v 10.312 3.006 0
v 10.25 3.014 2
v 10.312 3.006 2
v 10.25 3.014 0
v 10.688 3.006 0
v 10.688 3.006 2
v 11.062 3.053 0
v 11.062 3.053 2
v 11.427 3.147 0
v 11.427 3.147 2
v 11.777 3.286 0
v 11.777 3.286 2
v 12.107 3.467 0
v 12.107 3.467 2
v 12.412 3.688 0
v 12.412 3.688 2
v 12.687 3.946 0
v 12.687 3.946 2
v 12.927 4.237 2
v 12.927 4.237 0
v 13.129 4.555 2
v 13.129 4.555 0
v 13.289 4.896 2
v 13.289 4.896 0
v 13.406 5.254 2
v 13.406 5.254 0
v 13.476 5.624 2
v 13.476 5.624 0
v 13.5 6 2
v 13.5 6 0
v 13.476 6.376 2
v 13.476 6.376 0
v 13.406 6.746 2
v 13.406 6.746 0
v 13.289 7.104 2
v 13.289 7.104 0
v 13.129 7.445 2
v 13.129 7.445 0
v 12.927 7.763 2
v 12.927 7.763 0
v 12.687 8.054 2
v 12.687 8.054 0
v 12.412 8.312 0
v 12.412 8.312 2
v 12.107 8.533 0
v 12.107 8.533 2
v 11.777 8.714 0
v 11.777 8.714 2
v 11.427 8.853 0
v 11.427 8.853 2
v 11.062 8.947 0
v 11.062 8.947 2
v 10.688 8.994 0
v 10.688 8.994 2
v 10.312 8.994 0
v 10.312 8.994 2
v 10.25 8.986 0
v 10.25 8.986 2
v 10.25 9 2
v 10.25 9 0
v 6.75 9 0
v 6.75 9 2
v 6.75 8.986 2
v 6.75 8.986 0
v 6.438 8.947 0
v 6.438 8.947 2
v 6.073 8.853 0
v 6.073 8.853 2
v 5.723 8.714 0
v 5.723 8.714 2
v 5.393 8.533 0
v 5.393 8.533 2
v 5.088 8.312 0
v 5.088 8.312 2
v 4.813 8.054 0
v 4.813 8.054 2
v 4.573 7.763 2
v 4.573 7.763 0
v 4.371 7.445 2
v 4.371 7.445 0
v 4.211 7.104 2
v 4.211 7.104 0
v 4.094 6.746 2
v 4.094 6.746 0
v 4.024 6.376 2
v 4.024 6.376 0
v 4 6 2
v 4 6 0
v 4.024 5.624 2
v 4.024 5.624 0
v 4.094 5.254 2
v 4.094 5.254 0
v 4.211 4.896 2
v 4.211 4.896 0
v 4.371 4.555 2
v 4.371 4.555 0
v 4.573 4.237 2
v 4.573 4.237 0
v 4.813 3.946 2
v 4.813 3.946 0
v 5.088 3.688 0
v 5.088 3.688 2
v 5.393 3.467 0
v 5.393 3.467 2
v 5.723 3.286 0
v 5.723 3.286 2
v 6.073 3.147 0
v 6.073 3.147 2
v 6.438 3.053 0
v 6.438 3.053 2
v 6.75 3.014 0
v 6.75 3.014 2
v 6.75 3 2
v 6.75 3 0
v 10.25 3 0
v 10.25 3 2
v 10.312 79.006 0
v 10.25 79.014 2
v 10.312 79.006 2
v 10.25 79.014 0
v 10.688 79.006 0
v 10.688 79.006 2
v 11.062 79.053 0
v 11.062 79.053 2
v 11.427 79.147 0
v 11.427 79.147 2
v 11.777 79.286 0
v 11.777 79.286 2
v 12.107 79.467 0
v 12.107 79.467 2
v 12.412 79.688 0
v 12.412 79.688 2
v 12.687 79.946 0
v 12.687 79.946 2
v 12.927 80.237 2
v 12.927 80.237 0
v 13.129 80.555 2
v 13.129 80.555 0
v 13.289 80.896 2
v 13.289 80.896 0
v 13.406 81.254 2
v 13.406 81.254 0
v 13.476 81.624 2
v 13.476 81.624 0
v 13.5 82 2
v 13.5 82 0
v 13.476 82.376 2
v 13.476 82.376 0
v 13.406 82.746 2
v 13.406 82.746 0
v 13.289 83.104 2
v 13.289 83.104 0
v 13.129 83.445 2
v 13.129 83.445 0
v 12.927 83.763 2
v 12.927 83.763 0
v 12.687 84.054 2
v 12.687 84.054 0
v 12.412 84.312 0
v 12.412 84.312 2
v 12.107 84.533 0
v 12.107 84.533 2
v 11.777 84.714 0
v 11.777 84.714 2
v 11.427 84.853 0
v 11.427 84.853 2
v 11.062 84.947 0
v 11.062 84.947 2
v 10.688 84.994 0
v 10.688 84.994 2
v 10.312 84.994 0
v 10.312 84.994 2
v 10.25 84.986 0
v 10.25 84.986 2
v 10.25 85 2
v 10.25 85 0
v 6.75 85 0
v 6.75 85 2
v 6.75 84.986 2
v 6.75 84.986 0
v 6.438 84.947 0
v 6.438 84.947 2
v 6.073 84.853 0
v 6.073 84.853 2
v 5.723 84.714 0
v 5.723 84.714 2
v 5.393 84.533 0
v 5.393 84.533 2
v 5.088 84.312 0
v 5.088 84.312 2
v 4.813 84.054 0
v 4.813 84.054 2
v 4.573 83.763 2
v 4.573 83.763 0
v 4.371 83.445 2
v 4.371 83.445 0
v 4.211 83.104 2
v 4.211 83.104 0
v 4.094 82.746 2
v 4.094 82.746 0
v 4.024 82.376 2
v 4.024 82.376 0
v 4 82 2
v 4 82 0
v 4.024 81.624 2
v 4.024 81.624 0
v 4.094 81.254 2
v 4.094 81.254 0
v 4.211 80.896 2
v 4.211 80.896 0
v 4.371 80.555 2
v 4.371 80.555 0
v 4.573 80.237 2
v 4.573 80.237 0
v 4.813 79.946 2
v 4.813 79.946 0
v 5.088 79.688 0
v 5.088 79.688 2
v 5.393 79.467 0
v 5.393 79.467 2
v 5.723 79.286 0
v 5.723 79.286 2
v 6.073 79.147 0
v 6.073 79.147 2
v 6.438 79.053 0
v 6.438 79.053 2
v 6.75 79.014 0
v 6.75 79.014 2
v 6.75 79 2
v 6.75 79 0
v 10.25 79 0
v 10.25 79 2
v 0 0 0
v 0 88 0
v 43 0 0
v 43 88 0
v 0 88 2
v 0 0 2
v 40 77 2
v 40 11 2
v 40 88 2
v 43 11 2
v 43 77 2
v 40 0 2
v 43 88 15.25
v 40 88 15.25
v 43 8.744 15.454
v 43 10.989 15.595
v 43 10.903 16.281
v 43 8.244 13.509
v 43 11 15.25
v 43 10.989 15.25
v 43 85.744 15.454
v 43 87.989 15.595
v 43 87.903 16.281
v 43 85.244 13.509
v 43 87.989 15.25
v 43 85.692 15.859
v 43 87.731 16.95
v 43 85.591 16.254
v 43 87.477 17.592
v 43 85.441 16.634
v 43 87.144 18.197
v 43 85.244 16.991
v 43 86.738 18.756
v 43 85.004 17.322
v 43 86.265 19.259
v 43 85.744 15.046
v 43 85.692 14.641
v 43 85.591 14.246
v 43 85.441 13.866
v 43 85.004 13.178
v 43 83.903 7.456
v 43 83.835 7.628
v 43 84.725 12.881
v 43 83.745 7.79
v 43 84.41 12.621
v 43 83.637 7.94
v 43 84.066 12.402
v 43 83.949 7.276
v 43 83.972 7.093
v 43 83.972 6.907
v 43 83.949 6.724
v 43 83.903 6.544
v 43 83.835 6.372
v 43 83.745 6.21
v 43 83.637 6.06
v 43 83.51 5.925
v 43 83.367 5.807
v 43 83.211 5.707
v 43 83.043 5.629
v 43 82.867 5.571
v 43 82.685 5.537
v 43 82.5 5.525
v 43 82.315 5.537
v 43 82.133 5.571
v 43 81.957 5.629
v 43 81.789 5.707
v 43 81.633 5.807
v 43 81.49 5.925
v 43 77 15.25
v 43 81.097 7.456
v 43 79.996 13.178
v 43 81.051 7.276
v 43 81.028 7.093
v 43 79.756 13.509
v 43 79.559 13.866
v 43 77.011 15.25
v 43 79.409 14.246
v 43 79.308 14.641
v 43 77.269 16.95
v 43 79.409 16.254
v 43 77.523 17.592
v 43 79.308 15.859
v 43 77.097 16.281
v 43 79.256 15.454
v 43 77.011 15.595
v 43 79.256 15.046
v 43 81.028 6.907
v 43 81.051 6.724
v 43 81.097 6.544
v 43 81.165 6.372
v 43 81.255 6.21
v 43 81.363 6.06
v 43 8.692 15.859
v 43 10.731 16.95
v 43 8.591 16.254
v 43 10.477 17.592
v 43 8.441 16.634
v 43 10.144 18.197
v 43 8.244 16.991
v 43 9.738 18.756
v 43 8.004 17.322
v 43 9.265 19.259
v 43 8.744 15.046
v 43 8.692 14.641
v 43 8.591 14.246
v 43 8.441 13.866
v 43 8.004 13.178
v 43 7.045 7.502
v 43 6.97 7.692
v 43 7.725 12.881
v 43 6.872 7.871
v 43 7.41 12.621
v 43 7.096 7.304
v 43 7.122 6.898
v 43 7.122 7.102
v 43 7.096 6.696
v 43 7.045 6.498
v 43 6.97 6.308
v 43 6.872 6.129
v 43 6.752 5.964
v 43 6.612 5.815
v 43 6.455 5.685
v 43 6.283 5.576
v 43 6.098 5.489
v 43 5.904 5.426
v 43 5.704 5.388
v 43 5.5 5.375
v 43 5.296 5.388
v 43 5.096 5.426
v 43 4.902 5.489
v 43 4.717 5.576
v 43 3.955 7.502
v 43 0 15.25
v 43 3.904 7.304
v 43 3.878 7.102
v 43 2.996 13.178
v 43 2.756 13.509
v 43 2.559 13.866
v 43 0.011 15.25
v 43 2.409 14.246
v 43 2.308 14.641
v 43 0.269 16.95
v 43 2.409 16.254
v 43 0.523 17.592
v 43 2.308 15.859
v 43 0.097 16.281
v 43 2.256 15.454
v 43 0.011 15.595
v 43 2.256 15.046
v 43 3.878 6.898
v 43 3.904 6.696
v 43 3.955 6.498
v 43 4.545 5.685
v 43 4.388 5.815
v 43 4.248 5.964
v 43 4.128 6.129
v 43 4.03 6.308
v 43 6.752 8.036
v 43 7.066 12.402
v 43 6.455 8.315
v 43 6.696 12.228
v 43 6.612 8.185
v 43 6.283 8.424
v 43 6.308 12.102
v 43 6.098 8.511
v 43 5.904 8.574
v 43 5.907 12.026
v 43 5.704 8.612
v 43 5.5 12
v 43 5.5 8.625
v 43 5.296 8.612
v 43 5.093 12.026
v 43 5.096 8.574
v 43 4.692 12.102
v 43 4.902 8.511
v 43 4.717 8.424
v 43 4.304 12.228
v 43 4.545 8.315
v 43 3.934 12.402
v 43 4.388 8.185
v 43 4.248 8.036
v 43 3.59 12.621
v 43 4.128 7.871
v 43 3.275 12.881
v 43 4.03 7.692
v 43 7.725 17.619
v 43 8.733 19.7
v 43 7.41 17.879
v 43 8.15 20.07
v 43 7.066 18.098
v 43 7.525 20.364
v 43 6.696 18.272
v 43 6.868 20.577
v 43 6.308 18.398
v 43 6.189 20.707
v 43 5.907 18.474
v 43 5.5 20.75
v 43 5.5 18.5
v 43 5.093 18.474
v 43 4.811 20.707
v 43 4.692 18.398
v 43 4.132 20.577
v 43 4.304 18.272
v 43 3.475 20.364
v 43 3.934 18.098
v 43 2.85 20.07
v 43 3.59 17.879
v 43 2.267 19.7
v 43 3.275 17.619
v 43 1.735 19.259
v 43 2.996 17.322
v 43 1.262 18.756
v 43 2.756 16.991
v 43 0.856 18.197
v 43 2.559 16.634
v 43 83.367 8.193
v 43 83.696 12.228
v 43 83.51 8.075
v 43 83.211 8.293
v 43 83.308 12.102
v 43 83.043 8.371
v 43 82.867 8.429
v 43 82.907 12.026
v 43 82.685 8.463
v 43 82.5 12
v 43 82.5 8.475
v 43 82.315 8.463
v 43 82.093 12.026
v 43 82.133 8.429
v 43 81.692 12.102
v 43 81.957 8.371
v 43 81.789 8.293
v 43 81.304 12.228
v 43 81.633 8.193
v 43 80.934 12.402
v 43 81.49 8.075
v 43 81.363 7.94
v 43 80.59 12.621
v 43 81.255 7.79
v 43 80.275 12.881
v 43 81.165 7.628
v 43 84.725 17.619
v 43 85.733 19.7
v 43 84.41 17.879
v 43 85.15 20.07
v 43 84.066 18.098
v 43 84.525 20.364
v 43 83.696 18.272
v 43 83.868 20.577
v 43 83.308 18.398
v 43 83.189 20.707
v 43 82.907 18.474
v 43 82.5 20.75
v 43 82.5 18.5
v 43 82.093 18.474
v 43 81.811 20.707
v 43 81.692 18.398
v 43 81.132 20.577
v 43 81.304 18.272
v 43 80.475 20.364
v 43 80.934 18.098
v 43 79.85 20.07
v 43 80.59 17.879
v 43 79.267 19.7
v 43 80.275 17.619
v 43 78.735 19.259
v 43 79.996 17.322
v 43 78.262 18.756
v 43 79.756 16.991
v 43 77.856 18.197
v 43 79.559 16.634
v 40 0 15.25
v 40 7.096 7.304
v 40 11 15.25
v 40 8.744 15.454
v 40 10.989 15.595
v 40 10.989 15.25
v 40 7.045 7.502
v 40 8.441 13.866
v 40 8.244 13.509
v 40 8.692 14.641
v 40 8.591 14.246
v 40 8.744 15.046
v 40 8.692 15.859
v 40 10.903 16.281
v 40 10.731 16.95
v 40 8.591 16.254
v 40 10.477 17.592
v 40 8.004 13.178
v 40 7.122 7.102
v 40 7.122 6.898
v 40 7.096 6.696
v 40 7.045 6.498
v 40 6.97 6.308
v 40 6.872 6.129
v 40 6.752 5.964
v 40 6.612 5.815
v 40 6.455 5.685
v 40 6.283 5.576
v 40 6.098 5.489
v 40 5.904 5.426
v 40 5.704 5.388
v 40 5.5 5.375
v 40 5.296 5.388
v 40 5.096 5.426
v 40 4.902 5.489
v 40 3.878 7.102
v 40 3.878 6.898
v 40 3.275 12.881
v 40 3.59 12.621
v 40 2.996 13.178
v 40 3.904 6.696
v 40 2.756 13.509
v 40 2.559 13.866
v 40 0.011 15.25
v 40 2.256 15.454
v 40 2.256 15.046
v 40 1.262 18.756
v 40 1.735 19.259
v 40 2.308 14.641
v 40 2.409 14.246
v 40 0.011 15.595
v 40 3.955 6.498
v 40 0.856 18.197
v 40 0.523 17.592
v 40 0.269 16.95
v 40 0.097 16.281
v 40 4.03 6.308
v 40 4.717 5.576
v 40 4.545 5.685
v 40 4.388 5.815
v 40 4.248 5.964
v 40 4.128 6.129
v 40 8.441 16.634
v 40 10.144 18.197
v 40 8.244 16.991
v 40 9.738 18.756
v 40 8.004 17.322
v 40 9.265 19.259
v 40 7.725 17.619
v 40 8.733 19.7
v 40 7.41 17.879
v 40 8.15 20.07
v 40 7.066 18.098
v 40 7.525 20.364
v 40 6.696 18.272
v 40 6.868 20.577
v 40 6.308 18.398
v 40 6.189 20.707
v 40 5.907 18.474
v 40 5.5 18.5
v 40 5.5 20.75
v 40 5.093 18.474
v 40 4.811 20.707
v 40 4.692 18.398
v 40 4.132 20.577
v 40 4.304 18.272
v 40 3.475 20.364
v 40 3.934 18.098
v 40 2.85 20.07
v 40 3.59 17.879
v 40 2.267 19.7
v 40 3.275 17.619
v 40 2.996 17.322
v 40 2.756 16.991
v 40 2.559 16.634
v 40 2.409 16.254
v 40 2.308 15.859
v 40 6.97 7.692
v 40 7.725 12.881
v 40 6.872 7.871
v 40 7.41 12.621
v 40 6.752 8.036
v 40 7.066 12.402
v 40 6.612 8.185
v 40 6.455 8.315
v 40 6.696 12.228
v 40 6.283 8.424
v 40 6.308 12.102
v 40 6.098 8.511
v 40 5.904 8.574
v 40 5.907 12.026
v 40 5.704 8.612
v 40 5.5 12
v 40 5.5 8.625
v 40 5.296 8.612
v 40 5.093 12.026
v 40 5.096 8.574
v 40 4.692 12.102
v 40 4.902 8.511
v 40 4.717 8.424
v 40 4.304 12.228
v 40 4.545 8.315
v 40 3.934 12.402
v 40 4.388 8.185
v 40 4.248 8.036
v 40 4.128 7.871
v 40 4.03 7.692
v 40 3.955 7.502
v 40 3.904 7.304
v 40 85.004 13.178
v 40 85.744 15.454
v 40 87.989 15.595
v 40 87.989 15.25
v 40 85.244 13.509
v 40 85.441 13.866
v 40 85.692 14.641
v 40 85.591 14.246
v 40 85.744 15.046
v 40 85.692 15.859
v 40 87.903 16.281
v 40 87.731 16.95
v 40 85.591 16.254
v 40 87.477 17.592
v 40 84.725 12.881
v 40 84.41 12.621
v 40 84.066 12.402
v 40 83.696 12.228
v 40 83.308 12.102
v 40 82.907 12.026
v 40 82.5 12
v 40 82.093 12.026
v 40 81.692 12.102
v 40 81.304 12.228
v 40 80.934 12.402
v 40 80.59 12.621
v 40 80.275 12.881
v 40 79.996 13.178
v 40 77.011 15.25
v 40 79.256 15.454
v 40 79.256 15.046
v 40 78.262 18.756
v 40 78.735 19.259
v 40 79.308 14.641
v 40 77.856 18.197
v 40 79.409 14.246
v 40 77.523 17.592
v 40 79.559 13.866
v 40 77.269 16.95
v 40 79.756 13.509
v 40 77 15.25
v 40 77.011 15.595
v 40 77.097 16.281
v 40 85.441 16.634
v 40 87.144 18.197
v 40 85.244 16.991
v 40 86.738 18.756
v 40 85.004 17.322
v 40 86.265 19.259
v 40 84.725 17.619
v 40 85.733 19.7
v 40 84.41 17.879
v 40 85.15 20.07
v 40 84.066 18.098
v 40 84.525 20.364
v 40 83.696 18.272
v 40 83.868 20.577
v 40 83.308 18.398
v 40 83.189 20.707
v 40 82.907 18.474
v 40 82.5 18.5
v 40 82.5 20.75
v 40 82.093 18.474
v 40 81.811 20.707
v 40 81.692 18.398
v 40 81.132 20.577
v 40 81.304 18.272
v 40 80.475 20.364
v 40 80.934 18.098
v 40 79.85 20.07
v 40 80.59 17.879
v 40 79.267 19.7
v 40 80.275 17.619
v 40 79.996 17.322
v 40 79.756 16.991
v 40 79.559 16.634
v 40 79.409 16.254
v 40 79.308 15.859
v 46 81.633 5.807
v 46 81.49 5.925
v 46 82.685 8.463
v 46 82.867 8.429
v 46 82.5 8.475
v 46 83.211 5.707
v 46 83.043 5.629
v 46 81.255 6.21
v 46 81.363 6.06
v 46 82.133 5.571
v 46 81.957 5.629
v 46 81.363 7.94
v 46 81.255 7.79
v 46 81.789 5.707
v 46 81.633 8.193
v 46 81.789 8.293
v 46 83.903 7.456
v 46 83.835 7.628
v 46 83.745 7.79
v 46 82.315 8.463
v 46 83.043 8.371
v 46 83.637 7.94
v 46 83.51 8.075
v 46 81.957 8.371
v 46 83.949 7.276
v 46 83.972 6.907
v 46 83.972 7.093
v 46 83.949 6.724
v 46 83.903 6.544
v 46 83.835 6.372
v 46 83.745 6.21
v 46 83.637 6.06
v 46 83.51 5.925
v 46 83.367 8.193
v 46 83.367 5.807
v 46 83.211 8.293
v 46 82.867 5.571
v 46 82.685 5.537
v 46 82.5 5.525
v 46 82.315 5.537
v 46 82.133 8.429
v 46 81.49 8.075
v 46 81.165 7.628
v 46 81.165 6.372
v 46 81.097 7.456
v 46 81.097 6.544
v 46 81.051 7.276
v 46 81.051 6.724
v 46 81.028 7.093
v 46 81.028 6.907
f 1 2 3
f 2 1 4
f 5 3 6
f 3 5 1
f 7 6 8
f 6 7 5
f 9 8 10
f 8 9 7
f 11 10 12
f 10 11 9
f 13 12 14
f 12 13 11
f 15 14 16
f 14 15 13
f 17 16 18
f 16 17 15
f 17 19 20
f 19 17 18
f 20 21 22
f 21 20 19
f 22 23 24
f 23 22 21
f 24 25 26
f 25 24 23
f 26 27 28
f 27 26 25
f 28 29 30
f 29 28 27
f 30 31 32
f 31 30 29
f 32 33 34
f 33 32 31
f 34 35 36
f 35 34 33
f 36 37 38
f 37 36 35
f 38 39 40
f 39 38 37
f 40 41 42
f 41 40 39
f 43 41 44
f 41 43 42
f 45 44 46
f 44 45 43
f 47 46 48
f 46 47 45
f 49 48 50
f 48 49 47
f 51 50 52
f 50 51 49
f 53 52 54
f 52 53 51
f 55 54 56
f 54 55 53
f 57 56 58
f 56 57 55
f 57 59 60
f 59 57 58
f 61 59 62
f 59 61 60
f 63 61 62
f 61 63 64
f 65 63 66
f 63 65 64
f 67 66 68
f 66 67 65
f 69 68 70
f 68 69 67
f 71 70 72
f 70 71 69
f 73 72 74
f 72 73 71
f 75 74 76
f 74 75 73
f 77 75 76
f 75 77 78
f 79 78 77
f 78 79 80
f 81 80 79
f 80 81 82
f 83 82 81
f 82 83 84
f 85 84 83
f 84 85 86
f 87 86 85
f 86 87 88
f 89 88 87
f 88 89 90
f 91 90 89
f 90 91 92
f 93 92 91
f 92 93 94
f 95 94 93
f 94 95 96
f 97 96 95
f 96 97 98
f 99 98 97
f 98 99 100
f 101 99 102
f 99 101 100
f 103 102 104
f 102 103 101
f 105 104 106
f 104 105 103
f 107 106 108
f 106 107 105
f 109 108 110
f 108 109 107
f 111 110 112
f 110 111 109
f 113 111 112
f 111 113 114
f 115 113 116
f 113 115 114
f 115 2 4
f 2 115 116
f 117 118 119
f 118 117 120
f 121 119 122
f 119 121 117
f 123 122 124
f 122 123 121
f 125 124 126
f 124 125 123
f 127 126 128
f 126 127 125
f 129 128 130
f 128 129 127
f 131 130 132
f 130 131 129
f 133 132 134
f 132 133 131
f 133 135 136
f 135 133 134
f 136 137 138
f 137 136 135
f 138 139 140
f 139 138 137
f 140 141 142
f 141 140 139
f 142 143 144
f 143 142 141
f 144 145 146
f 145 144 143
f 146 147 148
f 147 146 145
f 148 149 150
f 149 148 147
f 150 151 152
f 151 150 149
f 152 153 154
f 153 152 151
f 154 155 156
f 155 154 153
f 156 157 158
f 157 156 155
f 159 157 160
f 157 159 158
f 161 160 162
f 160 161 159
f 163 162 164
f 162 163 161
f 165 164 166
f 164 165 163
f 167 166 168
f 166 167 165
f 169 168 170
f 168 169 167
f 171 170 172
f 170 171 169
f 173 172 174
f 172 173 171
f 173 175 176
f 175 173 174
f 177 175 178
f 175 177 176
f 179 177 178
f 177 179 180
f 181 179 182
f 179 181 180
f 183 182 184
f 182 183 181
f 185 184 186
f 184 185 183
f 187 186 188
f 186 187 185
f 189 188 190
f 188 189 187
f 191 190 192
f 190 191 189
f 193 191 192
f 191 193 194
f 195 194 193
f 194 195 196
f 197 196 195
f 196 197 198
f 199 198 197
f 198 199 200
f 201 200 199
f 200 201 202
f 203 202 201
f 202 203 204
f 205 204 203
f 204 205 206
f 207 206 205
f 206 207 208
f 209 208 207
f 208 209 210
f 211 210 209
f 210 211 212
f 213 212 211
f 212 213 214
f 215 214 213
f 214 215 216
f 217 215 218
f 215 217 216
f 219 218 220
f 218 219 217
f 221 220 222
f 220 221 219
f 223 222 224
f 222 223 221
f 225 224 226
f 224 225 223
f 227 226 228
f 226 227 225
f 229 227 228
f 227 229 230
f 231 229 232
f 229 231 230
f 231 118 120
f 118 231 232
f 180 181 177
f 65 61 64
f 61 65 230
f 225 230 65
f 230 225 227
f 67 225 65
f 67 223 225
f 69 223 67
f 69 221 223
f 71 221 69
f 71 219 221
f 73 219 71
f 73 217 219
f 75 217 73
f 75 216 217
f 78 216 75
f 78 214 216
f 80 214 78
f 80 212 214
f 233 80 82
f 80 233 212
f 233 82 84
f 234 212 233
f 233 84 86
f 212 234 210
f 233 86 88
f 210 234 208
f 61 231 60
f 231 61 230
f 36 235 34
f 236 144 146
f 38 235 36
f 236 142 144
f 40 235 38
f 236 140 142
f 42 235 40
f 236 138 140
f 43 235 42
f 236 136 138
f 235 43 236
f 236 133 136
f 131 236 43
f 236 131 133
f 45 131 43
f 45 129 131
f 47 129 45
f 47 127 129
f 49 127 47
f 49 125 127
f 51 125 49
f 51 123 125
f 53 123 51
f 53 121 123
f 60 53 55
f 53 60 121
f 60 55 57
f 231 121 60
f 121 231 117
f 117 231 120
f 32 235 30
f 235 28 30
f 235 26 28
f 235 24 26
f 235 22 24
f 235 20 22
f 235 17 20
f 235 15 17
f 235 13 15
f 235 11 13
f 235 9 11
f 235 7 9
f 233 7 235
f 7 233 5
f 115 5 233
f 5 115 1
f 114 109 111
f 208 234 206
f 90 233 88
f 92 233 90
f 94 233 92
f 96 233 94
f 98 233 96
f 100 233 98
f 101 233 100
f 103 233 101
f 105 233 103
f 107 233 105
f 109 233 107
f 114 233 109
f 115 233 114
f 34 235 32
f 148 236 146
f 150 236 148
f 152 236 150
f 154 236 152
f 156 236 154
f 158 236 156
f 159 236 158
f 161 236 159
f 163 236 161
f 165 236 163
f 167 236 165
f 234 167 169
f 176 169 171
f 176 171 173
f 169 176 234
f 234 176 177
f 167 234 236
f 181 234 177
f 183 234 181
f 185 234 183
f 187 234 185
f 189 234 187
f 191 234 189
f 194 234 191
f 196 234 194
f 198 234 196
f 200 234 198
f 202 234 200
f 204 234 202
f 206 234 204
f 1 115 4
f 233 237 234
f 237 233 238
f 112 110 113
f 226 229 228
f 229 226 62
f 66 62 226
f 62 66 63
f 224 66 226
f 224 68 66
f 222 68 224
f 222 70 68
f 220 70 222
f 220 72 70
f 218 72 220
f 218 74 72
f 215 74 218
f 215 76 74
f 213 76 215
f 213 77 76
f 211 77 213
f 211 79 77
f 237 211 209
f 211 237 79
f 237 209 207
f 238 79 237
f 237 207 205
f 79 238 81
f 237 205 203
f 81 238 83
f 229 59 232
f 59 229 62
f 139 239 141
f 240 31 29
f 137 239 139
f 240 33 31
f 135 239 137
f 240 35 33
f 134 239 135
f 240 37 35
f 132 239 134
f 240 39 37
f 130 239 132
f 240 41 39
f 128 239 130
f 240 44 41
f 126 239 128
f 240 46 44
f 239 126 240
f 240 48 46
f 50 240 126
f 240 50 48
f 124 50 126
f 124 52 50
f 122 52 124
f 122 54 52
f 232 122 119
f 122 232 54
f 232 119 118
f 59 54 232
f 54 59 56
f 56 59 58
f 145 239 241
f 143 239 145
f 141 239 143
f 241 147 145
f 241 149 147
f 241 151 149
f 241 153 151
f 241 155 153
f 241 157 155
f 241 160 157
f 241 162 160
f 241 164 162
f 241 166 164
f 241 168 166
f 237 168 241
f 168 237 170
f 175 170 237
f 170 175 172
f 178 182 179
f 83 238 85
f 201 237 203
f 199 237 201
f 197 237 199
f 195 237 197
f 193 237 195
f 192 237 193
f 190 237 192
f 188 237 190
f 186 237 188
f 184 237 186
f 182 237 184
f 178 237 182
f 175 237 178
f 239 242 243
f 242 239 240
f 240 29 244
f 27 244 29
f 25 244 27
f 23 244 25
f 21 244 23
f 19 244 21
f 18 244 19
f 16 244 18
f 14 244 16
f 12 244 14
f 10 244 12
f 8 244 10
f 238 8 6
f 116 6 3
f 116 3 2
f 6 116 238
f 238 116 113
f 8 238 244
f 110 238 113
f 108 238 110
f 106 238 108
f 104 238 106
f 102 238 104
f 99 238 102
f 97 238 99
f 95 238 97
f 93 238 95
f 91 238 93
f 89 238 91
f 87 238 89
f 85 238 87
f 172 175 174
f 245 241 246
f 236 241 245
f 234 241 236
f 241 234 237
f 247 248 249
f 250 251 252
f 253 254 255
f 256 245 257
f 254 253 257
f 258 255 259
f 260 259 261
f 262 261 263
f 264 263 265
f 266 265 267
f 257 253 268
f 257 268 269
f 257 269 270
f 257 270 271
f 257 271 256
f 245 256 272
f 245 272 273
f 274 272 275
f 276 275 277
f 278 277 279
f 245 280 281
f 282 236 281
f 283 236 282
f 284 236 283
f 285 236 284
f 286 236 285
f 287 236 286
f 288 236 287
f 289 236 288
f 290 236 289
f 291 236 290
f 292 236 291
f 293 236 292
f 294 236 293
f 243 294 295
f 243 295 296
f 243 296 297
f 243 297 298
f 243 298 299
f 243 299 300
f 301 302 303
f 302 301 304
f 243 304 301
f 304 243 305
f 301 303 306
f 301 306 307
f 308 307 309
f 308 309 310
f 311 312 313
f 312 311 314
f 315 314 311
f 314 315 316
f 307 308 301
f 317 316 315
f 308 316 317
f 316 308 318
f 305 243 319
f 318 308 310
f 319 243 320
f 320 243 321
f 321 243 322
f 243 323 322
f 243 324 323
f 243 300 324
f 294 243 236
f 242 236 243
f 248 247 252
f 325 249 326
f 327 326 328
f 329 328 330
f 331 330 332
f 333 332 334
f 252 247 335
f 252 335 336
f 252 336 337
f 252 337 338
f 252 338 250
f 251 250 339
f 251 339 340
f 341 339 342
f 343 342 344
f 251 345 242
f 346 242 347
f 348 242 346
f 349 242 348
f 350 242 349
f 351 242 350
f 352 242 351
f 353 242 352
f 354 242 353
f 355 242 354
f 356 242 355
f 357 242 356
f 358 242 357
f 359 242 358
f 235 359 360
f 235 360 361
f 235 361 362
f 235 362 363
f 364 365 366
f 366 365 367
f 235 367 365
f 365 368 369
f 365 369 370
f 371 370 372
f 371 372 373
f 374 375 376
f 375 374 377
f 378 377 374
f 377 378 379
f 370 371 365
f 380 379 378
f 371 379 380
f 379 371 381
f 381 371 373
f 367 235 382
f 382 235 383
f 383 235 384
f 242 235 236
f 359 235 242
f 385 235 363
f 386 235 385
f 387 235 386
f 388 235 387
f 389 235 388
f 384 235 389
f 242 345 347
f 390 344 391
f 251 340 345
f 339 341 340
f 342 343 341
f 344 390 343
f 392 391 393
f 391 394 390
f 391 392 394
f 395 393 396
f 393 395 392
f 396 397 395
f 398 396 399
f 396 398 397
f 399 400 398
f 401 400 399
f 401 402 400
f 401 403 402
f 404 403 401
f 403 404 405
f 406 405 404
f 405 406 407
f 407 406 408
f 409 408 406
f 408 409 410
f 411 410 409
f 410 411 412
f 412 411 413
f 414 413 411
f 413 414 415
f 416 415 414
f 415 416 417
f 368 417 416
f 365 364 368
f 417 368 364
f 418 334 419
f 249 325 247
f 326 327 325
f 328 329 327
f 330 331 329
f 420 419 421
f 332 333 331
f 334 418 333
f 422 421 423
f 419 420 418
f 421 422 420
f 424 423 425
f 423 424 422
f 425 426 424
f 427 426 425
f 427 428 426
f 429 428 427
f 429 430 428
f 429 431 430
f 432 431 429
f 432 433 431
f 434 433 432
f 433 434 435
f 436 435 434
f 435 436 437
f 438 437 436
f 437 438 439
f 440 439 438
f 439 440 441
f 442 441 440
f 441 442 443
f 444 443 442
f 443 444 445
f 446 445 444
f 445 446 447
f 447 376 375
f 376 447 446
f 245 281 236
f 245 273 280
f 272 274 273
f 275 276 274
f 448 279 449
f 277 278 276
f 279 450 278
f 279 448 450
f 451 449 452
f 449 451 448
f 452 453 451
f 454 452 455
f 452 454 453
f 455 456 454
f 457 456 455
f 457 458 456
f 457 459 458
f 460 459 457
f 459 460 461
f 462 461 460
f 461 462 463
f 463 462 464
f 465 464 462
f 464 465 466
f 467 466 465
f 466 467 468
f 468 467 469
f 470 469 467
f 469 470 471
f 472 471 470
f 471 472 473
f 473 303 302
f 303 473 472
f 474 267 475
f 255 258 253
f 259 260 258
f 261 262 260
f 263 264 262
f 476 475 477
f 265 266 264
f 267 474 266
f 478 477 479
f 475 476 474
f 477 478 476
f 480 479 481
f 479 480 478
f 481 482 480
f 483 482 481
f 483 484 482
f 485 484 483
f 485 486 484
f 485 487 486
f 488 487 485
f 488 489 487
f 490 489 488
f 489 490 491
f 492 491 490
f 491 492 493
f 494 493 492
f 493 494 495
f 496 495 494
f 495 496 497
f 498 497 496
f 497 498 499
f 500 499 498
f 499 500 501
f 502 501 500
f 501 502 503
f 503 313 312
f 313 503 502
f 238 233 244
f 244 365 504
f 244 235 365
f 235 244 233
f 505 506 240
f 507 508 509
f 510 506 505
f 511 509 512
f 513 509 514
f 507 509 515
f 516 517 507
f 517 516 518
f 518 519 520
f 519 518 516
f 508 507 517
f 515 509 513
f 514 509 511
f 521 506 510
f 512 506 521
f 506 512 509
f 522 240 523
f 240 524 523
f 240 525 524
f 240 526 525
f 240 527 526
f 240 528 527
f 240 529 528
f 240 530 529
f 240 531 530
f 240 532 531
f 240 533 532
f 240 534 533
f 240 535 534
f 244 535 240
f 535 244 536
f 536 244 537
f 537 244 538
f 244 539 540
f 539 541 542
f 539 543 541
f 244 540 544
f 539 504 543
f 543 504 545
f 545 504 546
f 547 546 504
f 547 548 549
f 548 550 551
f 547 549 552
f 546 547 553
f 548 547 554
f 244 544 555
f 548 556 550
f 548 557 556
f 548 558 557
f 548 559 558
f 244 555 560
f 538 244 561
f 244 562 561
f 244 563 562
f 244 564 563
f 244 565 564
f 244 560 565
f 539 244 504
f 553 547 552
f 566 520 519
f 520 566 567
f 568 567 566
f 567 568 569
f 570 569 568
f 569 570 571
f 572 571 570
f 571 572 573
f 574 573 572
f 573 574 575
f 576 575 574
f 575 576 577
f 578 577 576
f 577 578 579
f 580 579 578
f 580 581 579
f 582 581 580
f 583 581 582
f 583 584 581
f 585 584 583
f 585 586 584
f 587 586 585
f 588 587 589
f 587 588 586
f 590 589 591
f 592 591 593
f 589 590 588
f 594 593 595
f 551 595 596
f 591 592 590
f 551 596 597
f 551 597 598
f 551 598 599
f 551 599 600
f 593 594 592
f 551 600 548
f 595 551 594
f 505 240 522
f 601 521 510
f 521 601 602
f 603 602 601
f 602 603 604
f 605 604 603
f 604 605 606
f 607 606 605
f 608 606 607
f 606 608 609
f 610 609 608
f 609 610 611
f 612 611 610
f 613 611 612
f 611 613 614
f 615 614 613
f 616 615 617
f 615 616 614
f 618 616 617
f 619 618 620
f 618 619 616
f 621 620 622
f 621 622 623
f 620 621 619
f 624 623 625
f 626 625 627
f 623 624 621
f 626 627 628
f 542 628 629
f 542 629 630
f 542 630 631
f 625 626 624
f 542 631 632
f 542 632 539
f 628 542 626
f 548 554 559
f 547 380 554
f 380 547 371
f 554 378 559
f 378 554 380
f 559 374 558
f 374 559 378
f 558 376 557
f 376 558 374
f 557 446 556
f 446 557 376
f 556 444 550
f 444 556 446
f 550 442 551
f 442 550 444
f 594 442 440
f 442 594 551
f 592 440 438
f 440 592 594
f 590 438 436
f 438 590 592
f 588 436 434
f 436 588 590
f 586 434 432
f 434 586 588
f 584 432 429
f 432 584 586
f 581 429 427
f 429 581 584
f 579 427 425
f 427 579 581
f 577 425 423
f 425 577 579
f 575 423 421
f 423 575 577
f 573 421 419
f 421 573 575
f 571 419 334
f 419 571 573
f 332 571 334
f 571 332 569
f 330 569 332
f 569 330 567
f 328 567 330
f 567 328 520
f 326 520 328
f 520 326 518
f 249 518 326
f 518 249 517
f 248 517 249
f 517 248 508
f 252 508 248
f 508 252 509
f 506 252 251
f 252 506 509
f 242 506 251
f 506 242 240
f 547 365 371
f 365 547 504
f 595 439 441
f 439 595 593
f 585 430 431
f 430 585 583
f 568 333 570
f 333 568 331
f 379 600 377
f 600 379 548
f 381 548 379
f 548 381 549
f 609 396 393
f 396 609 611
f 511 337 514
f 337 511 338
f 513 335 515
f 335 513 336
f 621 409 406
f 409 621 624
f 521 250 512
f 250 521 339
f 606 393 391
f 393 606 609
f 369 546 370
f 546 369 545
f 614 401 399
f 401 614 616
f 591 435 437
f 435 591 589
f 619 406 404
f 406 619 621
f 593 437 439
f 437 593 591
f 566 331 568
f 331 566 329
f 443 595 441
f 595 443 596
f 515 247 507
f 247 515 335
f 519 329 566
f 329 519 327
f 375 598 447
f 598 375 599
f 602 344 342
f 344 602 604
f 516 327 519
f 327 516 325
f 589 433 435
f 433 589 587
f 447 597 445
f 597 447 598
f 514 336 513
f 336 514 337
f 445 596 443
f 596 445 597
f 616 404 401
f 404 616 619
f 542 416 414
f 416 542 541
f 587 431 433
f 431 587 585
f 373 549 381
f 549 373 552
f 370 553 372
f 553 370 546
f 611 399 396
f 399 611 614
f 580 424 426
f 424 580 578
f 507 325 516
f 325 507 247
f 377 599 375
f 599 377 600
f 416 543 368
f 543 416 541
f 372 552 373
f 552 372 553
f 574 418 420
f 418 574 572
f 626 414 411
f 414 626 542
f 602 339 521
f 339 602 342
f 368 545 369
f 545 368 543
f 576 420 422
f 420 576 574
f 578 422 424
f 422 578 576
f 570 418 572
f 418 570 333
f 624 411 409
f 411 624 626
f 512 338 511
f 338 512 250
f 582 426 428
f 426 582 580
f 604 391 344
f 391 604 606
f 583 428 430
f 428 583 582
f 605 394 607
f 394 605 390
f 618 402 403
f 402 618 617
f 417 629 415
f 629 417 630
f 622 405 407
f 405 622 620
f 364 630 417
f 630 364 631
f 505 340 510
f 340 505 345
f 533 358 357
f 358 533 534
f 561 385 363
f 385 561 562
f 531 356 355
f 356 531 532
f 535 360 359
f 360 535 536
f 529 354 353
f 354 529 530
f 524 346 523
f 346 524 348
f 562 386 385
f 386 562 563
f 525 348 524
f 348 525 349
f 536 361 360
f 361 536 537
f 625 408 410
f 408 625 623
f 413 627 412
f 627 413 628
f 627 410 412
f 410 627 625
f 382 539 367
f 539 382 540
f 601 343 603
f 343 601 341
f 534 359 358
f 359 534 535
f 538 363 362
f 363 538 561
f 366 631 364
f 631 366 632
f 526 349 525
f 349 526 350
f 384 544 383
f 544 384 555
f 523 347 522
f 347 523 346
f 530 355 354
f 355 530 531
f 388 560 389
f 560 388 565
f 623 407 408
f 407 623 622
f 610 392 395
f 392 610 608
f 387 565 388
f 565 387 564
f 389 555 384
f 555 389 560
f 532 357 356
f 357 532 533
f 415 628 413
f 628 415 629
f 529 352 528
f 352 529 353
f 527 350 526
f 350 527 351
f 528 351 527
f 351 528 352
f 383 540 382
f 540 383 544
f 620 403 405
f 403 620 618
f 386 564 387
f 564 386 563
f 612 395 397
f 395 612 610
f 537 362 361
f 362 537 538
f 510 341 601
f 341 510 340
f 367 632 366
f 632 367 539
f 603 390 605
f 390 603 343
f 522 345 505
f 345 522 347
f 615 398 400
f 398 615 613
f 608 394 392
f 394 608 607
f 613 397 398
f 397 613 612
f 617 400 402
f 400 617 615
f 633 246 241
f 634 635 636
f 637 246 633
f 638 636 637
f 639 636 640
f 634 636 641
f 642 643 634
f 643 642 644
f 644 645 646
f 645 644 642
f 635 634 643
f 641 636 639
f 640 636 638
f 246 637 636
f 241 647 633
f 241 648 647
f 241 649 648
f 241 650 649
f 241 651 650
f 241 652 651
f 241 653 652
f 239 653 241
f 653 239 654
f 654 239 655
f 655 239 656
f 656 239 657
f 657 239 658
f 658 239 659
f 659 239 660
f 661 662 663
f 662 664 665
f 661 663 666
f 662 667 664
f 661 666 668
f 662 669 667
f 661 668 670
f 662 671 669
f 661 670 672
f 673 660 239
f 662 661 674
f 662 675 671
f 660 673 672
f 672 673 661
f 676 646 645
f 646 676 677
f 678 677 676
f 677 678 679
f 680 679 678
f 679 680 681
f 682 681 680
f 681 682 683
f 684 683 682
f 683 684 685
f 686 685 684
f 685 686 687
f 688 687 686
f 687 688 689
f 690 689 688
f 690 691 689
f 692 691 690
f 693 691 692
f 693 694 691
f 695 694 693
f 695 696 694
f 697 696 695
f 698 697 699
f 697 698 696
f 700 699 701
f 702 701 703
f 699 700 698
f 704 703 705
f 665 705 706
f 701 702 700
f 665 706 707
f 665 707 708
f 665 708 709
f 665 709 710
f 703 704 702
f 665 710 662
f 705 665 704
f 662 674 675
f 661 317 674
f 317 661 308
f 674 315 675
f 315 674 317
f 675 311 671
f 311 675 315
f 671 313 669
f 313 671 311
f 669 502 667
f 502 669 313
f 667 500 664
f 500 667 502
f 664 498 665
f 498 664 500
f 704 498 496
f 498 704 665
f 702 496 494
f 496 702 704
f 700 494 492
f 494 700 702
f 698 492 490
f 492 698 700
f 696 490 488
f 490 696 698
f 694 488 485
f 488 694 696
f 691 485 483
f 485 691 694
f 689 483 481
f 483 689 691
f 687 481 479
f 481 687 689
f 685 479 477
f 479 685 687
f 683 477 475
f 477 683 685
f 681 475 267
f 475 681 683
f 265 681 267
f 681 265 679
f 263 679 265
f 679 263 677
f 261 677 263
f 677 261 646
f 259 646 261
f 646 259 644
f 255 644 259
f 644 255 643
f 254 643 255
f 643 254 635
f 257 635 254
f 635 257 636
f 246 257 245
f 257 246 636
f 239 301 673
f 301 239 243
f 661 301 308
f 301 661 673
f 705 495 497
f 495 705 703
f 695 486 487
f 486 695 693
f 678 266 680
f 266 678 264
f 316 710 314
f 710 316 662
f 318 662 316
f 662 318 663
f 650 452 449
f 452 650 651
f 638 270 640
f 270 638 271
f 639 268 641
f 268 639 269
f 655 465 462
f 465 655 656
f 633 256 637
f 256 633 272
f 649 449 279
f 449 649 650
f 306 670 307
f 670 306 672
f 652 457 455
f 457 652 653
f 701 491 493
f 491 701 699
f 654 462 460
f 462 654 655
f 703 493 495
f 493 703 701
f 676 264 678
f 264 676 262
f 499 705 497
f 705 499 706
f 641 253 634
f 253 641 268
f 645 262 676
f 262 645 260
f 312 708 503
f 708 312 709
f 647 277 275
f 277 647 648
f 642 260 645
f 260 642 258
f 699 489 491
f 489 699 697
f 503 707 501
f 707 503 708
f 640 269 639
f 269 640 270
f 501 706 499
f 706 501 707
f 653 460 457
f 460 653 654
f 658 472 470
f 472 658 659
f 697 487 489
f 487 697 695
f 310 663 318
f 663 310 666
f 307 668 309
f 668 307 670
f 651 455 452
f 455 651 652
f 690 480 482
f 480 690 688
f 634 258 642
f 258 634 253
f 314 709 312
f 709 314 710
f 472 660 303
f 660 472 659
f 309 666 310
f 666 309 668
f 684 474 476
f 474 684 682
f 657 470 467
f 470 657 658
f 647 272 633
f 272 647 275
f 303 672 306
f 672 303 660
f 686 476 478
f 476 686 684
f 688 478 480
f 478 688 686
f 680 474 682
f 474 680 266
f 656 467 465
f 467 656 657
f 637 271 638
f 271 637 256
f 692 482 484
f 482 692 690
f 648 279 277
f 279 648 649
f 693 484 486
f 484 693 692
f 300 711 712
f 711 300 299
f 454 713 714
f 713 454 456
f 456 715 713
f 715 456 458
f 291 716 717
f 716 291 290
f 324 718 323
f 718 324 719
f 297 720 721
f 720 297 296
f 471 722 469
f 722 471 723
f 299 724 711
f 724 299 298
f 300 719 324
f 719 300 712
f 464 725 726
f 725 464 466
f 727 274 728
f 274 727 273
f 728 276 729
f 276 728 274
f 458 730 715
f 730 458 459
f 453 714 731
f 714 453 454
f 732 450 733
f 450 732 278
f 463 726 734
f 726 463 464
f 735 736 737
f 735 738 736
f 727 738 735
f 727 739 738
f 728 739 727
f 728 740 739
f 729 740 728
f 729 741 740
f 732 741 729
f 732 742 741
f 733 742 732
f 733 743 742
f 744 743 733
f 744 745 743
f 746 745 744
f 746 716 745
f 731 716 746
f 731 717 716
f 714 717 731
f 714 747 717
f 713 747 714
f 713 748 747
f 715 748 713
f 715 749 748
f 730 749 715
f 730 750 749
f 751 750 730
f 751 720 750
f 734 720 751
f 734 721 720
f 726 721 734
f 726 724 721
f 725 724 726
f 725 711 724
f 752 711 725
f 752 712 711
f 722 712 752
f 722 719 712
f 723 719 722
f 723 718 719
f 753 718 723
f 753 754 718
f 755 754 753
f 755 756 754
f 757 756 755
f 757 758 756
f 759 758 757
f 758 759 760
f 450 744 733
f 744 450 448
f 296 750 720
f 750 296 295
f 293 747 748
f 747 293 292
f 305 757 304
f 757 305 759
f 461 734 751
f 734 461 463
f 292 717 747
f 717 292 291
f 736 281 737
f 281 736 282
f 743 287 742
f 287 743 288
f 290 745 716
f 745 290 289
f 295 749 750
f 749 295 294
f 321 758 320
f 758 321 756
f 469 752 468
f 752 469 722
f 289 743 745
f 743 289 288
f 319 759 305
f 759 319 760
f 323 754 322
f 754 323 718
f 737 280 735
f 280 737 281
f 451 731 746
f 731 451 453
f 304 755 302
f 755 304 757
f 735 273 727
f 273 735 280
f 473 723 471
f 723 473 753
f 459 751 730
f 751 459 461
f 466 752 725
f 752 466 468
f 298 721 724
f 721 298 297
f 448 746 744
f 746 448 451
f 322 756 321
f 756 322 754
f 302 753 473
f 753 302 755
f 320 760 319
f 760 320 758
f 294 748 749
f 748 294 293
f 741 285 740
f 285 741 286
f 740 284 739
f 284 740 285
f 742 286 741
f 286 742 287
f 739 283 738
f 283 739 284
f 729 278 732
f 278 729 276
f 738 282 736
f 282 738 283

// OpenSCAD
eps = 1;

$fn=50;
_1u = 44;
face = [43, 2 * _1u, 2];
screwHoleDim = [9.5,6];
holeRadius = 3.25;
holePosX = 10;
supportDim = [11, holePosX + holeRadius, 3];

attachPinR = holeRadius/2;

difference() {
    linear_extrude(face.z) square([face.x, face.y]);
    translate([4, 0, -eps/2]) {
        translate([0, 0+3, 0]) linear_extrude(face.z+eps) screwHole();
        translate([0, face.y-screwHoleDim.y-3, 0]) linear_extrude(face.z+eps) screwHole();
    }
}

translate([face.x,0,face.z]) {
    difference() {
        rodSupport();
        translate([eps/2,supportDim.x/2,holePosX/2]) rotate([0,-90,0]) 
            linear_extrude(supportDim.z+eps) circle(attachPinR);
    }
    
    translate([0,face.y-supportDim.x,0]) {
        rodSupport();
        translate([supportDim.z,supportDim.x/2,holePosX/2]) rotate([0,-90,0]) 
            linear_extrude(supportDim.z+eps) circle(attachPinR-.15);
    }
}

module screwHole() {
    translate([3,3,0]) {
        circle(3);
        translate([3.5,0,0]) circle(3);
        translate([1.5,0,0]) square([3.5,6], true);
    }
}

module rodSupport() {
    rotate([0,-90,0])
    difference() {
        union() {
            linear_extrude(supportDim.z) {
                square([supportDim.y,supportDim.x]);
                translate([holePosX + holeRadius, supportDim.x/2, 0]) circle(supportDim.x/2);
            }
        }
        translate([holePosX + holeRadius, supportDim.x/2, -eps/2]) 
            linear_extrude(supportDim.z+eps) 
                #circle(holeRadius);
    }
}
